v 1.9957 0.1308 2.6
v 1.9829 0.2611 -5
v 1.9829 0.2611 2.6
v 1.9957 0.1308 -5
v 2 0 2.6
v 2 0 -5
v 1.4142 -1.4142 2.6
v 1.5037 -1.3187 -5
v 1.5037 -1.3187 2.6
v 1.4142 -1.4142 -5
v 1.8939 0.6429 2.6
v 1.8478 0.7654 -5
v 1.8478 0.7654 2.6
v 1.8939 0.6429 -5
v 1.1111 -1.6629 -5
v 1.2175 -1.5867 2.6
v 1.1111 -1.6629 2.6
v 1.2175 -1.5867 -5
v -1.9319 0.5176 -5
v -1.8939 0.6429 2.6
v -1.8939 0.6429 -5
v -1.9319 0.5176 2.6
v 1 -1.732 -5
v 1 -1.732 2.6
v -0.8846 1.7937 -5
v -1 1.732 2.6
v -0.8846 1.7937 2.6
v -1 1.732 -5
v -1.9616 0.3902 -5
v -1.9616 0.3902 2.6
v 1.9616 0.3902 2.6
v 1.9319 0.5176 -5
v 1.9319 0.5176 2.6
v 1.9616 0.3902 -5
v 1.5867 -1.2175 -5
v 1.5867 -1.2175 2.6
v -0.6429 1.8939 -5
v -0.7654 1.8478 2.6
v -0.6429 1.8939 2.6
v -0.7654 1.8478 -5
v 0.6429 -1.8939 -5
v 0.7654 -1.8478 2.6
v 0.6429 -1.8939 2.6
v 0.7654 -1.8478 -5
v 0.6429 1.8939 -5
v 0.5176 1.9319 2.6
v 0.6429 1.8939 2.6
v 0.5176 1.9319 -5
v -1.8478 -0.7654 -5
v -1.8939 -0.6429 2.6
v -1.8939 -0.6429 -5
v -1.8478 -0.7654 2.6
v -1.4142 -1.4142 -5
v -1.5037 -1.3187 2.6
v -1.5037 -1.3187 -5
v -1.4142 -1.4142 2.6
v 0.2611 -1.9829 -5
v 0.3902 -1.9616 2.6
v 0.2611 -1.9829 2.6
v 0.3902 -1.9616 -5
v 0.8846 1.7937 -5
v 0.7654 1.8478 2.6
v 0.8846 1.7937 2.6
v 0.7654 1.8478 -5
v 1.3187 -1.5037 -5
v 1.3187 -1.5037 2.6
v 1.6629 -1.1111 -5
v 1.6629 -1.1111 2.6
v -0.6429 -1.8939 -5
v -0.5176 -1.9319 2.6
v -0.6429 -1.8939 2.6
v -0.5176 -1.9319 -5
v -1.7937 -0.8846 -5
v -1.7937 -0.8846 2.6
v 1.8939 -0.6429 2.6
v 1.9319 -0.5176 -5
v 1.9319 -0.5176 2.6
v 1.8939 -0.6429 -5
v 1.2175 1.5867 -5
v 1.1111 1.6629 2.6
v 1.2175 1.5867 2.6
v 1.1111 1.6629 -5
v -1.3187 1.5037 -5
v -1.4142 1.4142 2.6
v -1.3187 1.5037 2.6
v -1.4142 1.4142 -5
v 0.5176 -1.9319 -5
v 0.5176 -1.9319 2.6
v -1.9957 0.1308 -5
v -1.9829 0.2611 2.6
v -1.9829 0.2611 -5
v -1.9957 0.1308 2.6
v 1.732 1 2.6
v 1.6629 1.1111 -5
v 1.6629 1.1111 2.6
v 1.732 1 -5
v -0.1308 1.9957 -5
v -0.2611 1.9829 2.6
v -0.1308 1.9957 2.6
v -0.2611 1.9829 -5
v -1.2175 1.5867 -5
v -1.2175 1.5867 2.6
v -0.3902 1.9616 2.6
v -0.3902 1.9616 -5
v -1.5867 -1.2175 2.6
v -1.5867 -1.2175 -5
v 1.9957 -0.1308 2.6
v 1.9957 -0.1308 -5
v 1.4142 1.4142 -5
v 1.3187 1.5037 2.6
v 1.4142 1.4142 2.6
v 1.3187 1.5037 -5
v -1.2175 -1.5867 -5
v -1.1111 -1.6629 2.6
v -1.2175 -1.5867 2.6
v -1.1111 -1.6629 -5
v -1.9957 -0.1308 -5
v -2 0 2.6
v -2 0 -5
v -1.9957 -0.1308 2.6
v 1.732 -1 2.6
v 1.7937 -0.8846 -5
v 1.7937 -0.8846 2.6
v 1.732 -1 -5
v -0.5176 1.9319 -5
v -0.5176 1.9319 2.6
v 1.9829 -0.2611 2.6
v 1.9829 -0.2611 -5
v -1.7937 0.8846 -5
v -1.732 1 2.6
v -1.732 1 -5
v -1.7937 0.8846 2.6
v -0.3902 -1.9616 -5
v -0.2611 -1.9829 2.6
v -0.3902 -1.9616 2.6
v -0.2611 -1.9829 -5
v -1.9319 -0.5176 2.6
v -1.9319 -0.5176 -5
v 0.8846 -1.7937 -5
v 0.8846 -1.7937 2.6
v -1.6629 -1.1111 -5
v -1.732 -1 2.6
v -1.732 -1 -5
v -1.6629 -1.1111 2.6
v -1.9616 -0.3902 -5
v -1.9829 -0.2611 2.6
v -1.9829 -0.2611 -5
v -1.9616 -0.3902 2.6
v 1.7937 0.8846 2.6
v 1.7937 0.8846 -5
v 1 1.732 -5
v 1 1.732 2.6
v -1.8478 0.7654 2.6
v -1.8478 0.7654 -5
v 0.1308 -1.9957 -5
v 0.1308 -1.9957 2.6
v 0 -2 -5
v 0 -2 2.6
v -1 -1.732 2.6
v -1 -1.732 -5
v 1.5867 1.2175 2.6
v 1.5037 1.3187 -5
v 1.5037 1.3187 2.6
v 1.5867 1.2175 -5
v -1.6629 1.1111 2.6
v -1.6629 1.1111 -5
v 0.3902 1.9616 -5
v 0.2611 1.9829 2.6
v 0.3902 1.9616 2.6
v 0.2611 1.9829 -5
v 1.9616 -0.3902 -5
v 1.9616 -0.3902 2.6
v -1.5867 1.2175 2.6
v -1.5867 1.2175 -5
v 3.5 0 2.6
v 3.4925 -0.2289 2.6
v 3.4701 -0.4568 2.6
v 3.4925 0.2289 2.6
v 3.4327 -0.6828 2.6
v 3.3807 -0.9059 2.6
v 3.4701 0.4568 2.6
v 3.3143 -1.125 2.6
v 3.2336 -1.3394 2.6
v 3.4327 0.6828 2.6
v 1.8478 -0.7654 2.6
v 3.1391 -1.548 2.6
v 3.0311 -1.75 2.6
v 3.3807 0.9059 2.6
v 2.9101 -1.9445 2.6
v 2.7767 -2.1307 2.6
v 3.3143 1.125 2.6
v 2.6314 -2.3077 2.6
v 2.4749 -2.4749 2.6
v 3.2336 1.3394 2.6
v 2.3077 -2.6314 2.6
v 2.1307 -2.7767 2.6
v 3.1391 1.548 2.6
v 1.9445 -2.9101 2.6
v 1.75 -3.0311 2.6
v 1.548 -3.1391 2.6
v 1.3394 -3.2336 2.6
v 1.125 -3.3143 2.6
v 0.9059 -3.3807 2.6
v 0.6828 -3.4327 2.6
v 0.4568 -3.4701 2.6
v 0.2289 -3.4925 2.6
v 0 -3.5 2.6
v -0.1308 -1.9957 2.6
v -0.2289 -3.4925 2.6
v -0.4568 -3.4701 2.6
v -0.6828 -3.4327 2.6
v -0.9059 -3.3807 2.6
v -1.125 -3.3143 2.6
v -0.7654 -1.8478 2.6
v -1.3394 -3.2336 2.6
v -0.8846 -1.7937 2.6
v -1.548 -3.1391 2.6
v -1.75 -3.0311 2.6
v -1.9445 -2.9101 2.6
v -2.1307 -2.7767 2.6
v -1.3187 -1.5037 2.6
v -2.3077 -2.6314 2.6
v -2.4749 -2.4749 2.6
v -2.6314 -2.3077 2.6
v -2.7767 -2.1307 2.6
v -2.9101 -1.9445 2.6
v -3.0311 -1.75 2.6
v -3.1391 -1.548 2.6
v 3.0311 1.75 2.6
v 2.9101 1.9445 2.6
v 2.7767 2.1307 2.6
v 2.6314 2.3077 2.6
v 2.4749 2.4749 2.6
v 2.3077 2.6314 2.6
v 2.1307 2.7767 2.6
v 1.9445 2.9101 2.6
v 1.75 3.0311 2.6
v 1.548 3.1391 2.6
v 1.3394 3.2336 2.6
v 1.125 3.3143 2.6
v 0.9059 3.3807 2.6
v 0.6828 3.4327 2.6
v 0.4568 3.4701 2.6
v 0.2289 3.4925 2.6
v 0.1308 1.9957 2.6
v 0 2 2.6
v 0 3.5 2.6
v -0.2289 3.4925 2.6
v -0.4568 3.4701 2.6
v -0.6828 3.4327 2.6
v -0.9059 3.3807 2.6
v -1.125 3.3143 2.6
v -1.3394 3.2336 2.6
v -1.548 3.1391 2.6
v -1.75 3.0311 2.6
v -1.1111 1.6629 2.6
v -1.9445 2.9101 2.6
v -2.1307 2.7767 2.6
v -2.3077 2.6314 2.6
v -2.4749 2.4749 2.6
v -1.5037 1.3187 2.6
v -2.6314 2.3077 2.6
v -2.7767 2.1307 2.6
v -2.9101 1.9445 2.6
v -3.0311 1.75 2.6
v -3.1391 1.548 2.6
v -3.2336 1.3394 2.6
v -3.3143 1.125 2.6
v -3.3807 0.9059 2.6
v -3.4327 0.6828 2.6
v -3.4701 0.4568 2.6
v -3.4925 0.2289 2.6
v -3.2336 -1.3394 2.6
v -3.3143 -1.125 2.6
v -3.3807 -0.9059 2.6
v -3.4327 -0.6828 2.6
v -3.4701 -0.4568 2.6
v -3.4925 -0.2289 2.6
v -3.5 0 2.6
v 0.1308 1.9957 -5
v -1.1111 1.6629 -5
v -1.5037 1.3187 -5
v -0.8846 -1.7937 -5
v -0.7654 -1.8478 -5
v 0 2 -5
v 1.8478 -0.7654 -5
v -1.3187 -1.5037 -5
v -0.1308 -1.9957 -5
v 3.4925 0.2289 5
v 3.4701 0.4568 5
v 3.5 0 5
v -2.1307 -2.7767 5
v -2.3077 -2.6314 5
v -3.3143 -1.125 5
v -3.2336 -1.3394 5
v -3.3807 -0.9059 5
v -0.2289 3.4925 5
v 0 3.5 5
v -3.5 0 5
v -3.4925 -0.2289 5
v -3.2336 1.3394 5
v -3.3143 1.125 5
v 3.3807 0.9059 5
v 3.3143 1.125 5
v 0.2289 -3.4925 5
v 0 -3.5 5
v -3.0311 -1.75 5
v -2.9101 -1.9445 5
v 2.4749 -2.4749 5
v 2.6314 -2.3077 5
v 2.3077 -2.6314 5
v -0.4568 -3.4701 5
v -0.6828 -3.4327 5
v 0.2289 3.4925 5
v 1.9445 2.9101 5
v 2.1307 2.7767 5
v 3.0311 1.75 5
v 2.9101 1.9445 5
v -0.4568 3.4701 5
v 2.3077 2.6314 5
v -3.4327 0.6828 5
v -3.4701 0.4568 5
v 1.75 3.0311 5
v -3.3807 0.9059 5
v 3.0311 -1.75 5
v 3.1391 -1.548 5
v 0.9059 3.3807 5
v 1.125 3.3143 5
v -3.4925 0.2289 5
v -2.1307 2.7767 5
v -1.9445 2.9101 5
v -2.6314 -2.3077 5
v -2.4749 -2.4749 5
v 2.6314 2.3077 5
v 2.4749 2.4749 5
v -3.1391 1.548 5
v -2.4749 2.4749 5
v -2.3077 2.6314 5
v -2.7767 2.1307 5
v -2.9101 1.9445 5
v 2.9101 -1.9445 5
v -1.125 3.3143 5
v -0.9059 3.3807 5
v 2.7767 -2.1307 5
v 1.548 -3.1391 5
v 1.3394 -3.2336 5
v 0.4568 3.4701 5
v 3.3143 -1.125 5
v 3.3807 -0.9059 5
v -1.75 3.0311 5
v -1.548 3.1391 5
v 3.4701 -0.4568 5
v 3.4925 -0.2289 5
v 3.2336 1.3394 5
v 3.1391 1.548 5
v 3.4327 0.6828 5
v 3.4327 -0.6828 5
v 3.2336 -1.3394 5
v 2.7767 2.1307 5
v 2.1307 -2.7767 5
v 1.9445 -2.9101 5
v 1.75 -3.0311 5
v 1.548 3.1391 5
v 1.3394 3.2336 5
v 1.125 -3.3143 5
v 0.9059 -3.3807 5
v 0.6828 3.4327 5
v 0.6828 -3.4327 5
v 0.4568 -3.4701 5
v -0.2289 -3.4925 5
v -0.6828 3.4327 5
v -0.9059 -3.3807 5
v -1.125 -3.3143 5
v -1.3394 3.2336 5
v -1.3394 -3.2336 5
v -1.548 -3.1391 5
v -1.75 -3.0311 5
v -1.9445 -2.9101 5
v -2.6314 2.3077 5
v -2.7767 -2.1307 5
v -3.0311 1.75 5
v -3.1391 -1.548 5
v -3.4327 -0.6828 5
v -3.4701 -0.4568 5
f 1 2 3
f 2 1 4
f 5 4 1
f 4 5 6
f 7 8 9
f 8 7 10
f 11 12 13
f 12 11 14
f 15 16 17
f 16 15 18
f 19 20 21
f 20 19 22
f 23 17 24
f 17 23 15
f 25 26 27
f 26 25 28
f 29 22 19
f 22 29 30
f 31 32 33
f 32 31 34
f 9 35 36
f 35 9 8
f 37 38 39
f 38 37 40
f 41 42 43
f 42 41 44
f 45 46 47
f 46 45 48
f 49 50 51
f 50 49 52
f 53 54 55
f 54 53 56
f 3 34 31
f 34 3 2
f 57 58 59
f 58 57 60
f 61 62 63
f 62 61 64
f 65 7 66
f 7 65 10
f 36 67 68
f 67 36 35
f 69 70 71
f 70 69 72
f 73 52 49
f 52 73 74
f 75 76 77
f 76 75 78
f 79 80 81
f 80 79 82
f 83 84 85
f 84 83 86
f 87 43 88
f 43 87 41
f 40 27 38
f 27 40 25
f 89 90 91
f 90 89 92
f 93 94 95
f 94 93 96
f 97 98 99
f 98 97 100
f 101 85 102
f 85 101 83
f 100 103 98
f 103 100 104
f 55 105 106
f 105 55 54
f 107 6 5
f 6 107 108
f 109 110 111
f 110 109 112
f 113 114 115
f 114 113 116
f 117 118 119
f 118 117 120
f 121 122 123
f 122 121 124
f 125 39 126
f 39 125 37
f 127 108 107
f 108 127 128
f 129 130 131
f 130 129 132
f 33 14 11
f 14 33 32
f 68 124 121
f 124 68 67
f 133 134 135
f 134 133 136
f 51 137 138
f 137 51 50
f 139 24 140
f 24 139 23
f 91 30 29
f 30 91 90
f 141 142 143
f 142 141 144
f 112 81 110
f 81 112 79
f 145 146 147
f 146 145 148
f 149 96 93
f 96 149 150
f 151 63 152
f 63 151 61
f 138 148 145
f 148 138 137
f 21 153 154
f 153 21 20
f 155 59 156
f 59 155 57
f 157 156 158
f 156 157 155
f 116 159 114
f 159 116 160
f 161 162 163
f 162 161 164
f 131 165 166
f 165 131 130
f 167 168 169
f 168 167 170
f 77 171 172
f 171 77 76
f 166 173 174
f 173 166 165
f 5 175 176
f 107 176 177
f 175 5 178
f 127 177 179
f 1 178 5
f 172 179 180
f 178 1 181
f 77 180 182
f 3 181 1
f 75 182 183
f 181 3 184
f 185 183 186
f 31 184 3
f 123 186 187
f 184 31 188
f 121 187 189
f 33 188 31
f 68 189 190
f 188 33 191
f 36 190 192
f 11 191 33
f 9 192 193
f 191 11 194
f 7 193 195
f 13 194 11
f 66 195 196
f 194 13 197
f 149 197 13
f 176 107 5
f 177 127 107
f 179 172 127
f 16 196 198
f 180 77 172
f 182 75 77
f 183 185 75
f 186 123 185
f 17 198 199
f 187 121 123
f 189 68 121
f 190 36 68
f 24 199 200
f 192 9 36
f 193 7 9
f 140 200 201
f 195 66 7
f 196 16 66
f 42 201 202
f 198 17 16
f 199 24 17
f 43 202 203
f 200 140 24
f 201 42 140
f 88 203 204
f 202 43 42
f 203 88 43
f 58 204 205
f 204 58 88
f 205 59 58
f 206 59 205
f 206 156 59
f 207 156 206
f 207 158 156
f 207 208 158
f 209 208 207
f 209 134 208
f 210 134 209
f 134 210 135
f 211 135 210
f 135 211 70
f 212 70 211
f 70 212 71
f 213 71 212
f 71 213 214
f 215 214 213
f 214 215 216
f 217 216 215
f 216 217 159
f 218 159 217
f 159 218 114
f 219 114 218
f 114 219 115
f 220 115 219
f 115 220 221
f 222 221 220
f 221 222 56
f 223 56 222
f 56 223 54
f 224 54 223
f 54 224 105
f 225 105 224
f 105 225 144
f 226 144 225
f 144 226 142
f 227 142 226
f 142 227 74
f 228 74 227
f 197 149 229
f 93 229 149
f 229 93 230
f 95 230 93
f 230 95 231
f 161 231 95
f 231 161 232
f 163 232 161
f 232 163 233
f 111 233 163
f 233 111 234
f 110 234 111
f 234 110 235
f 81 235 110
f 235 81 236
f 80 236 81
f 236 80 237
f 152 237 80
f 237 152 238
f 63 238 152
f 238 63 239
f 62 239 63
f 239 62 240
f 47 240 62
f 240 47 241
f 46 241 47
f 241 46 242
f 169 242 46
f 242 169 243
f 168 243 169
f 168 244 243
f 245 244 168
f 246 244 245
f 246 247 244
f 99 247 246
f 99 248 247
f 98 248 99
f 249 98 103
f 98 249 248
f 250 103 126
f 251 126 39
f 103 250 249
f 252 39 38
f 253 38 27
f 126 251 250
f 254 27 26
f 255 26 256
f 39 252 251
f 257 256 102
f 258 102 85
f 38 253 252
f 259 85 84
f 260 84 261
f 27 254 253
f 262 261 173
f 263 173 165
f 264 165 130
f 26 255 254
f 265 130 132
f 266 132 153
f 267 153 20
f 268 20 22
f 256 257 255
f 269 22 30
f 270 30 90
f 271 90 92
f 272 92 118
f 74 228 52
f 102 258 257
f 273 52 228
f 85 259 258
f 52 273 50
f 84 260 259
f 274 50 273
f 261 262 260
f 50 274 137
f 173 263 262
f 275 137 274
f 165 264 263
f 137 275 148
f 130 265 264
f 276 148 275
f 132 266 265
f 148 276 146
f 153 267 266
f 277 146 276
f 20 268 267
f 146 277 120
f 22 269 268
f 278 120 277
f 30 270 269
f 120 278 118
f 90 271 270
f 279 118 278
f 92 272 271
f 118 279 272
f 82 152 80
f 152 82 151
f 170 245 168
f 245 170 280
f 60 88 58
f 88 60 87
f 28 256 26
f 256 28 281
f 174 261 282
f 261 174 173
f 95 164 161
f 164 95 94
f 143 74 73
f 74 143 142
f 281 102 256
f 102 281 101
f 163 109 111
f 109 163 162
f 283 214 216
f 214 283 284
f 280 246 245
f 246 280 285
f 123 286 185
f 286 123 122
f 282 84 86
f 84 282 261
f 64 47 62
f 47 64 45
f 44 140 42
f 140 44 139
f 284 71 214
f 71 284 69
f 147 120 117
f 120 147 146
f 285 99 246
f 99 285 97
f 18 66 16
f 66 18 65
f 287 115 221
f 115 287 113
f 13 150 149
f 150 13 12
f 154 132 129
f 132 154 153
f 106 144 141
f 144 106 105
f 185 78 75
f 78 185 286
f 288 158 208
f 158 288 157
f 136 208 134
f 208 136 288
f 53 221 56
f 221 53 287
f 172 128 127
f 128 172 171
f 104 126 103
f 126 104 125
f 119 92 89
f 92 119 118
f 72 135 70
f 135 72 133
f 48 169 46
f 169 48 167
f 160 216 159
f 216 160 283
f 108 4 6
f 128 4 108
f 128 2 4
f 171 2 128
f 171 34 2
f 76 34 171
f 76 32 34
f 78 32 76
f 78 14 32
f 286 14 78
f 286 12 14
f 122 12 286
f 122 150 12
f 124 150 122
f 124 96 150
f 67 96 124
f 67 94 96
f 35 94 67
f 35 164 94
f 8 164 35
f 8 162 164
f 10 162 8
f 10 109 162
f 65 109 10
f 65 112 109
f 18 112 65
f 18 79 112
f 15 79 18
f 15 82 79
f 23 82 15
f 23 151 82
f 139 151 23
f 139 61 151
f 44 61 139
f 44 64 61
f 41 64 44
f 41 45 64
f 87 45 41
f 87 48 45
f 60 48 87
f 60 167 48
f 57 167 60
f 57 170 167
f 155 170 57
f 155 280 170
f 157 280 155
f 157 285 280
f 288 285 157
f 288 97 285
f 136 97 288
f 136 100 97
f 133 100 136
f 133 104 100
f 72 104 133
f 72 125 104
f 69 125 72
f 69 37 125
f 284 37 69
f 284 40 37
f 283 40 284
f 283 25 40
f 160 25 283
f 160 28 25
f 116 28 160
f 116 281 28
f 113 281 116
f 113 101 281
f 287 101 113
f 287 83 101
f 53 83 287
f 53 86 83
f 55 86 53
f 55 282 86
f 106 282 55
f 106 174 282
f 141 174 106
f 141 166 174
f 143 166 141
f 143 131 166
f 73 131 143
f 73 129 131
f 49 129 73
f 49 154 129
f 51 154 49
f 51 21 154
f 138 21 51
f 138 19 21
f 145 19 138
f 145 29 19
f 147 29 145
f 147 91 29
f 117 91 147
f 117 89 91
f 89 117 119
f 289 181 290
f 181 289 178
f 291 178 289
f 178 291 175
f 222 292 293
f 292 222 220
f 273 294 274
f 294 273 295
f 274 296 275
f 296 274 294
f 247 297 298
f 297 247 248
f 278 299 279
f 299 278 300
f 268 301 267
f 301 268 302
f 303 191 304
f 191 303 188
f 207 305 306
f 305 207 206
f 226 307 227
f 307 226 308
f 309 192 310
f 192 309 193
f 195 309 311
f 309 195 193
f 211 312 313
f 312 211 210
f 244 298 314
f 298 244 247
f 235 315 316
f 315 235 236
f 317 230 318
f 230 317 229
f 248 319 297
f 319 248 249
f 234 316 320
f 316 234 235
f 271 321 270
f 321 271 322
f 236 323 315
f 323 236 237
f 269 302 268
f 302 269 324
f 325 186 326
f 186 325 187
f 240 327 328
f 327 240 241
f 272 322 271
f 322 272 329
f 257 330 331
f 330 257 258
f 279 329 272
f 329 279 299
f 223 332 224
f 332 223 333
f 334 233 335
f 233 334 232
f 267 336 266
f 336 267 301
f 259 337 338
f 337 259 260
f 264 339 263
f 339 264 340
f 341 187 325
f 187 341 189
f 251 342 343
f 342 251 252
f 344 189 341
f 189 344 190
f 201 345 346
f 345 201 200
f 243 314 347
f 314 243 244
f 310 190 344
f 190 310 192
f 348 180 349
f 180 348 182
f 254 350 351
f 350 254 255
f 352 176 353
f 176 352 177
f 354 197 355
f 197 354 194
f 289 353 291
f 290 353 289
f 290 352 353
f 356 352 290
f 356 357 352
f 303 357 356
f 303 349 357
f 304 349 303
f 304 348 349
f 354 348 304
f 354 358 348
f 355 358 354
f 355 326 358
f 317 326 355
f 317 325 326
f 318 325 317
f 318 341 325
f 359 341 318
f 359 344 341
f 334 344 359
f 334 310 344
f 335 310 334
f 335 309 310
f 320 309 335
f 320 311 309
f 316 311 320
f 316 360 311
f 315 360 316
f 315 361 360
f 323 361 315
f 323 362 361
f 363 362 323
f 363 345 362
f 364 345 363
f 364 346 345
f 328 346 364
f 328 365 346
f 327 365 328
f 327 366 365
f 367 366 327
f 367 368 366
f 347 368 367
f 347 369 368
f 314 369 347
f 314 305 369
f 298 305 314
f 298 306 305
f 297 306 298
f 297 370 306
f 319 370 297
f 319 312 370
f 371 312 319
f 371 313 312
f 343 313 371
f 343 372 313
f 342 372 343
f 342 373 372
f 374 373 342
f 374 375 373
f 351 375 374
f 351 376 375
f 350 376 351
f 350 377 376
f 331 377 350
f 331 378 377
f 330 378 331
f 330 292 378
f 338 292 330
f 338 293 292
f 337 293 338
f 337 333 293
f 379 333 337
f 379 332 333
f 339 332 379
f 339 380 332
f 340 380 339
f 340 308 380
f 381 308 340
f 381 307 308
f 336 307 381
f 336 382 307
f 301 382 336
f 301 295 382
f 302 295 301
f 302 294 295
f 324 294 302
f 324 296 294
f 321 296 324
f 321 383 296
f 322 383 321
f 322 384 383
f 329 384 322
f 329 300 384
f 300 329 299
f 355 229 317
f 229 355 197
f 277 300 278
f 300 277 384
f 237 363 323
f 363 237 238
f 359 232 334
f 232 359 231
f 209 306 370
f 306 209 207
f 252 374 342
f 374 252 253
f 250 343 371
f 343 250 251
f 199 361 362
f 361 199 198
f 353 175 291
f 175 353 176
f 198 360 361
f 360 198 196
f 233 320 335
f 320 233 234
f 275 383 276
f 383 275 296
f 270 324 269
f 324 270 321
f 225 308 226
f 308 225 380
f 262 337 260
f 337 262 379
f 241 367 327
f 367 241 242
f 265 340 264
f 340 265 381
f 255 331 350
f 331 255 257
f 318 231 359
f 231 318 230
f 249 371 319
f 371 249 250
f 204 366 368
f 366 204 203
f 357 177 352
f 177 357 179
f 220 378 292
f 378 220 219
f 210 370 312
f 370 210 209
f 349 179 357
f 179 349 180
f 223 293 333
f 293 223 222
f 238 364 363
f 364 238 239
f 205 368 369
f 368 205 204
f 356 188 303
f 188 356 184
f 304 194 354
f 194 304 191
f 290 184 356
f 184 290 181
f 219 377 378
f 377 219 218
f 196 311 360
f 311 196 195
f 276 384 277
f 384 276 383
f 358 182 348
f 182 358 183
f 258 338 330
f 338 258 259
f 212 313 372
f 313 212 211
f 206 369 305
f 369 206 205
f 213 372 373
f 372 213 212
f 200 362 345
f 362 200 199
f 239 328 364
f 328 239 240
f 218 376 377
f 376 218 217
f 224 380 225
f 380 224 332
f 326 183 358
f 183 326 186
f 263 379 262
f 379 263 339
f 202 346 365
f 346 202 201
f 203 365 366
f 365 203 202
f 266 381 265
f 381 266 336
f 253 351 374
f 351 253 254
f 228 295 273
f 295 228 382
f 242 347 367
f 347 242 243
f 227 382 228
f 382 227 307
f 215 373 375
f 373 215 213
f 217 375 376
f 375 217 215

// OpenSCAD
$fn=96;

d_shaft = 4.0;
r_shaft = d_shaft/2;
d_head  = 7.0;
r_head  = d_head/2;
h_head  = 2.4;
len_total = 10.0;
h_shaft = len_total - h_head;

module screw_shaft(d=4.0, h=7.6) {
    cylinder(d=d, h=h, center=false);
}

module screw_head(d=7.0, h=2.4) {
    cylinder(d=d, h=h, center=false);
}

module screw(d_shaft=4.0, d_head=7.0, h_head=2.4, len_total=10.0) {
    h_shaft = len_total - h_head;
    translate([0,0,-len_total/2])
    union() {
        screw_shaft(d=d_shaft, h=h_shaft);
        translate([0,0,h_shaft]) screw_head(d=d_head, h=h_head);
    }
}

screw(d_shaft=d_shaft, d_head=d_head, h_head=h_head, len_total=len_total);
